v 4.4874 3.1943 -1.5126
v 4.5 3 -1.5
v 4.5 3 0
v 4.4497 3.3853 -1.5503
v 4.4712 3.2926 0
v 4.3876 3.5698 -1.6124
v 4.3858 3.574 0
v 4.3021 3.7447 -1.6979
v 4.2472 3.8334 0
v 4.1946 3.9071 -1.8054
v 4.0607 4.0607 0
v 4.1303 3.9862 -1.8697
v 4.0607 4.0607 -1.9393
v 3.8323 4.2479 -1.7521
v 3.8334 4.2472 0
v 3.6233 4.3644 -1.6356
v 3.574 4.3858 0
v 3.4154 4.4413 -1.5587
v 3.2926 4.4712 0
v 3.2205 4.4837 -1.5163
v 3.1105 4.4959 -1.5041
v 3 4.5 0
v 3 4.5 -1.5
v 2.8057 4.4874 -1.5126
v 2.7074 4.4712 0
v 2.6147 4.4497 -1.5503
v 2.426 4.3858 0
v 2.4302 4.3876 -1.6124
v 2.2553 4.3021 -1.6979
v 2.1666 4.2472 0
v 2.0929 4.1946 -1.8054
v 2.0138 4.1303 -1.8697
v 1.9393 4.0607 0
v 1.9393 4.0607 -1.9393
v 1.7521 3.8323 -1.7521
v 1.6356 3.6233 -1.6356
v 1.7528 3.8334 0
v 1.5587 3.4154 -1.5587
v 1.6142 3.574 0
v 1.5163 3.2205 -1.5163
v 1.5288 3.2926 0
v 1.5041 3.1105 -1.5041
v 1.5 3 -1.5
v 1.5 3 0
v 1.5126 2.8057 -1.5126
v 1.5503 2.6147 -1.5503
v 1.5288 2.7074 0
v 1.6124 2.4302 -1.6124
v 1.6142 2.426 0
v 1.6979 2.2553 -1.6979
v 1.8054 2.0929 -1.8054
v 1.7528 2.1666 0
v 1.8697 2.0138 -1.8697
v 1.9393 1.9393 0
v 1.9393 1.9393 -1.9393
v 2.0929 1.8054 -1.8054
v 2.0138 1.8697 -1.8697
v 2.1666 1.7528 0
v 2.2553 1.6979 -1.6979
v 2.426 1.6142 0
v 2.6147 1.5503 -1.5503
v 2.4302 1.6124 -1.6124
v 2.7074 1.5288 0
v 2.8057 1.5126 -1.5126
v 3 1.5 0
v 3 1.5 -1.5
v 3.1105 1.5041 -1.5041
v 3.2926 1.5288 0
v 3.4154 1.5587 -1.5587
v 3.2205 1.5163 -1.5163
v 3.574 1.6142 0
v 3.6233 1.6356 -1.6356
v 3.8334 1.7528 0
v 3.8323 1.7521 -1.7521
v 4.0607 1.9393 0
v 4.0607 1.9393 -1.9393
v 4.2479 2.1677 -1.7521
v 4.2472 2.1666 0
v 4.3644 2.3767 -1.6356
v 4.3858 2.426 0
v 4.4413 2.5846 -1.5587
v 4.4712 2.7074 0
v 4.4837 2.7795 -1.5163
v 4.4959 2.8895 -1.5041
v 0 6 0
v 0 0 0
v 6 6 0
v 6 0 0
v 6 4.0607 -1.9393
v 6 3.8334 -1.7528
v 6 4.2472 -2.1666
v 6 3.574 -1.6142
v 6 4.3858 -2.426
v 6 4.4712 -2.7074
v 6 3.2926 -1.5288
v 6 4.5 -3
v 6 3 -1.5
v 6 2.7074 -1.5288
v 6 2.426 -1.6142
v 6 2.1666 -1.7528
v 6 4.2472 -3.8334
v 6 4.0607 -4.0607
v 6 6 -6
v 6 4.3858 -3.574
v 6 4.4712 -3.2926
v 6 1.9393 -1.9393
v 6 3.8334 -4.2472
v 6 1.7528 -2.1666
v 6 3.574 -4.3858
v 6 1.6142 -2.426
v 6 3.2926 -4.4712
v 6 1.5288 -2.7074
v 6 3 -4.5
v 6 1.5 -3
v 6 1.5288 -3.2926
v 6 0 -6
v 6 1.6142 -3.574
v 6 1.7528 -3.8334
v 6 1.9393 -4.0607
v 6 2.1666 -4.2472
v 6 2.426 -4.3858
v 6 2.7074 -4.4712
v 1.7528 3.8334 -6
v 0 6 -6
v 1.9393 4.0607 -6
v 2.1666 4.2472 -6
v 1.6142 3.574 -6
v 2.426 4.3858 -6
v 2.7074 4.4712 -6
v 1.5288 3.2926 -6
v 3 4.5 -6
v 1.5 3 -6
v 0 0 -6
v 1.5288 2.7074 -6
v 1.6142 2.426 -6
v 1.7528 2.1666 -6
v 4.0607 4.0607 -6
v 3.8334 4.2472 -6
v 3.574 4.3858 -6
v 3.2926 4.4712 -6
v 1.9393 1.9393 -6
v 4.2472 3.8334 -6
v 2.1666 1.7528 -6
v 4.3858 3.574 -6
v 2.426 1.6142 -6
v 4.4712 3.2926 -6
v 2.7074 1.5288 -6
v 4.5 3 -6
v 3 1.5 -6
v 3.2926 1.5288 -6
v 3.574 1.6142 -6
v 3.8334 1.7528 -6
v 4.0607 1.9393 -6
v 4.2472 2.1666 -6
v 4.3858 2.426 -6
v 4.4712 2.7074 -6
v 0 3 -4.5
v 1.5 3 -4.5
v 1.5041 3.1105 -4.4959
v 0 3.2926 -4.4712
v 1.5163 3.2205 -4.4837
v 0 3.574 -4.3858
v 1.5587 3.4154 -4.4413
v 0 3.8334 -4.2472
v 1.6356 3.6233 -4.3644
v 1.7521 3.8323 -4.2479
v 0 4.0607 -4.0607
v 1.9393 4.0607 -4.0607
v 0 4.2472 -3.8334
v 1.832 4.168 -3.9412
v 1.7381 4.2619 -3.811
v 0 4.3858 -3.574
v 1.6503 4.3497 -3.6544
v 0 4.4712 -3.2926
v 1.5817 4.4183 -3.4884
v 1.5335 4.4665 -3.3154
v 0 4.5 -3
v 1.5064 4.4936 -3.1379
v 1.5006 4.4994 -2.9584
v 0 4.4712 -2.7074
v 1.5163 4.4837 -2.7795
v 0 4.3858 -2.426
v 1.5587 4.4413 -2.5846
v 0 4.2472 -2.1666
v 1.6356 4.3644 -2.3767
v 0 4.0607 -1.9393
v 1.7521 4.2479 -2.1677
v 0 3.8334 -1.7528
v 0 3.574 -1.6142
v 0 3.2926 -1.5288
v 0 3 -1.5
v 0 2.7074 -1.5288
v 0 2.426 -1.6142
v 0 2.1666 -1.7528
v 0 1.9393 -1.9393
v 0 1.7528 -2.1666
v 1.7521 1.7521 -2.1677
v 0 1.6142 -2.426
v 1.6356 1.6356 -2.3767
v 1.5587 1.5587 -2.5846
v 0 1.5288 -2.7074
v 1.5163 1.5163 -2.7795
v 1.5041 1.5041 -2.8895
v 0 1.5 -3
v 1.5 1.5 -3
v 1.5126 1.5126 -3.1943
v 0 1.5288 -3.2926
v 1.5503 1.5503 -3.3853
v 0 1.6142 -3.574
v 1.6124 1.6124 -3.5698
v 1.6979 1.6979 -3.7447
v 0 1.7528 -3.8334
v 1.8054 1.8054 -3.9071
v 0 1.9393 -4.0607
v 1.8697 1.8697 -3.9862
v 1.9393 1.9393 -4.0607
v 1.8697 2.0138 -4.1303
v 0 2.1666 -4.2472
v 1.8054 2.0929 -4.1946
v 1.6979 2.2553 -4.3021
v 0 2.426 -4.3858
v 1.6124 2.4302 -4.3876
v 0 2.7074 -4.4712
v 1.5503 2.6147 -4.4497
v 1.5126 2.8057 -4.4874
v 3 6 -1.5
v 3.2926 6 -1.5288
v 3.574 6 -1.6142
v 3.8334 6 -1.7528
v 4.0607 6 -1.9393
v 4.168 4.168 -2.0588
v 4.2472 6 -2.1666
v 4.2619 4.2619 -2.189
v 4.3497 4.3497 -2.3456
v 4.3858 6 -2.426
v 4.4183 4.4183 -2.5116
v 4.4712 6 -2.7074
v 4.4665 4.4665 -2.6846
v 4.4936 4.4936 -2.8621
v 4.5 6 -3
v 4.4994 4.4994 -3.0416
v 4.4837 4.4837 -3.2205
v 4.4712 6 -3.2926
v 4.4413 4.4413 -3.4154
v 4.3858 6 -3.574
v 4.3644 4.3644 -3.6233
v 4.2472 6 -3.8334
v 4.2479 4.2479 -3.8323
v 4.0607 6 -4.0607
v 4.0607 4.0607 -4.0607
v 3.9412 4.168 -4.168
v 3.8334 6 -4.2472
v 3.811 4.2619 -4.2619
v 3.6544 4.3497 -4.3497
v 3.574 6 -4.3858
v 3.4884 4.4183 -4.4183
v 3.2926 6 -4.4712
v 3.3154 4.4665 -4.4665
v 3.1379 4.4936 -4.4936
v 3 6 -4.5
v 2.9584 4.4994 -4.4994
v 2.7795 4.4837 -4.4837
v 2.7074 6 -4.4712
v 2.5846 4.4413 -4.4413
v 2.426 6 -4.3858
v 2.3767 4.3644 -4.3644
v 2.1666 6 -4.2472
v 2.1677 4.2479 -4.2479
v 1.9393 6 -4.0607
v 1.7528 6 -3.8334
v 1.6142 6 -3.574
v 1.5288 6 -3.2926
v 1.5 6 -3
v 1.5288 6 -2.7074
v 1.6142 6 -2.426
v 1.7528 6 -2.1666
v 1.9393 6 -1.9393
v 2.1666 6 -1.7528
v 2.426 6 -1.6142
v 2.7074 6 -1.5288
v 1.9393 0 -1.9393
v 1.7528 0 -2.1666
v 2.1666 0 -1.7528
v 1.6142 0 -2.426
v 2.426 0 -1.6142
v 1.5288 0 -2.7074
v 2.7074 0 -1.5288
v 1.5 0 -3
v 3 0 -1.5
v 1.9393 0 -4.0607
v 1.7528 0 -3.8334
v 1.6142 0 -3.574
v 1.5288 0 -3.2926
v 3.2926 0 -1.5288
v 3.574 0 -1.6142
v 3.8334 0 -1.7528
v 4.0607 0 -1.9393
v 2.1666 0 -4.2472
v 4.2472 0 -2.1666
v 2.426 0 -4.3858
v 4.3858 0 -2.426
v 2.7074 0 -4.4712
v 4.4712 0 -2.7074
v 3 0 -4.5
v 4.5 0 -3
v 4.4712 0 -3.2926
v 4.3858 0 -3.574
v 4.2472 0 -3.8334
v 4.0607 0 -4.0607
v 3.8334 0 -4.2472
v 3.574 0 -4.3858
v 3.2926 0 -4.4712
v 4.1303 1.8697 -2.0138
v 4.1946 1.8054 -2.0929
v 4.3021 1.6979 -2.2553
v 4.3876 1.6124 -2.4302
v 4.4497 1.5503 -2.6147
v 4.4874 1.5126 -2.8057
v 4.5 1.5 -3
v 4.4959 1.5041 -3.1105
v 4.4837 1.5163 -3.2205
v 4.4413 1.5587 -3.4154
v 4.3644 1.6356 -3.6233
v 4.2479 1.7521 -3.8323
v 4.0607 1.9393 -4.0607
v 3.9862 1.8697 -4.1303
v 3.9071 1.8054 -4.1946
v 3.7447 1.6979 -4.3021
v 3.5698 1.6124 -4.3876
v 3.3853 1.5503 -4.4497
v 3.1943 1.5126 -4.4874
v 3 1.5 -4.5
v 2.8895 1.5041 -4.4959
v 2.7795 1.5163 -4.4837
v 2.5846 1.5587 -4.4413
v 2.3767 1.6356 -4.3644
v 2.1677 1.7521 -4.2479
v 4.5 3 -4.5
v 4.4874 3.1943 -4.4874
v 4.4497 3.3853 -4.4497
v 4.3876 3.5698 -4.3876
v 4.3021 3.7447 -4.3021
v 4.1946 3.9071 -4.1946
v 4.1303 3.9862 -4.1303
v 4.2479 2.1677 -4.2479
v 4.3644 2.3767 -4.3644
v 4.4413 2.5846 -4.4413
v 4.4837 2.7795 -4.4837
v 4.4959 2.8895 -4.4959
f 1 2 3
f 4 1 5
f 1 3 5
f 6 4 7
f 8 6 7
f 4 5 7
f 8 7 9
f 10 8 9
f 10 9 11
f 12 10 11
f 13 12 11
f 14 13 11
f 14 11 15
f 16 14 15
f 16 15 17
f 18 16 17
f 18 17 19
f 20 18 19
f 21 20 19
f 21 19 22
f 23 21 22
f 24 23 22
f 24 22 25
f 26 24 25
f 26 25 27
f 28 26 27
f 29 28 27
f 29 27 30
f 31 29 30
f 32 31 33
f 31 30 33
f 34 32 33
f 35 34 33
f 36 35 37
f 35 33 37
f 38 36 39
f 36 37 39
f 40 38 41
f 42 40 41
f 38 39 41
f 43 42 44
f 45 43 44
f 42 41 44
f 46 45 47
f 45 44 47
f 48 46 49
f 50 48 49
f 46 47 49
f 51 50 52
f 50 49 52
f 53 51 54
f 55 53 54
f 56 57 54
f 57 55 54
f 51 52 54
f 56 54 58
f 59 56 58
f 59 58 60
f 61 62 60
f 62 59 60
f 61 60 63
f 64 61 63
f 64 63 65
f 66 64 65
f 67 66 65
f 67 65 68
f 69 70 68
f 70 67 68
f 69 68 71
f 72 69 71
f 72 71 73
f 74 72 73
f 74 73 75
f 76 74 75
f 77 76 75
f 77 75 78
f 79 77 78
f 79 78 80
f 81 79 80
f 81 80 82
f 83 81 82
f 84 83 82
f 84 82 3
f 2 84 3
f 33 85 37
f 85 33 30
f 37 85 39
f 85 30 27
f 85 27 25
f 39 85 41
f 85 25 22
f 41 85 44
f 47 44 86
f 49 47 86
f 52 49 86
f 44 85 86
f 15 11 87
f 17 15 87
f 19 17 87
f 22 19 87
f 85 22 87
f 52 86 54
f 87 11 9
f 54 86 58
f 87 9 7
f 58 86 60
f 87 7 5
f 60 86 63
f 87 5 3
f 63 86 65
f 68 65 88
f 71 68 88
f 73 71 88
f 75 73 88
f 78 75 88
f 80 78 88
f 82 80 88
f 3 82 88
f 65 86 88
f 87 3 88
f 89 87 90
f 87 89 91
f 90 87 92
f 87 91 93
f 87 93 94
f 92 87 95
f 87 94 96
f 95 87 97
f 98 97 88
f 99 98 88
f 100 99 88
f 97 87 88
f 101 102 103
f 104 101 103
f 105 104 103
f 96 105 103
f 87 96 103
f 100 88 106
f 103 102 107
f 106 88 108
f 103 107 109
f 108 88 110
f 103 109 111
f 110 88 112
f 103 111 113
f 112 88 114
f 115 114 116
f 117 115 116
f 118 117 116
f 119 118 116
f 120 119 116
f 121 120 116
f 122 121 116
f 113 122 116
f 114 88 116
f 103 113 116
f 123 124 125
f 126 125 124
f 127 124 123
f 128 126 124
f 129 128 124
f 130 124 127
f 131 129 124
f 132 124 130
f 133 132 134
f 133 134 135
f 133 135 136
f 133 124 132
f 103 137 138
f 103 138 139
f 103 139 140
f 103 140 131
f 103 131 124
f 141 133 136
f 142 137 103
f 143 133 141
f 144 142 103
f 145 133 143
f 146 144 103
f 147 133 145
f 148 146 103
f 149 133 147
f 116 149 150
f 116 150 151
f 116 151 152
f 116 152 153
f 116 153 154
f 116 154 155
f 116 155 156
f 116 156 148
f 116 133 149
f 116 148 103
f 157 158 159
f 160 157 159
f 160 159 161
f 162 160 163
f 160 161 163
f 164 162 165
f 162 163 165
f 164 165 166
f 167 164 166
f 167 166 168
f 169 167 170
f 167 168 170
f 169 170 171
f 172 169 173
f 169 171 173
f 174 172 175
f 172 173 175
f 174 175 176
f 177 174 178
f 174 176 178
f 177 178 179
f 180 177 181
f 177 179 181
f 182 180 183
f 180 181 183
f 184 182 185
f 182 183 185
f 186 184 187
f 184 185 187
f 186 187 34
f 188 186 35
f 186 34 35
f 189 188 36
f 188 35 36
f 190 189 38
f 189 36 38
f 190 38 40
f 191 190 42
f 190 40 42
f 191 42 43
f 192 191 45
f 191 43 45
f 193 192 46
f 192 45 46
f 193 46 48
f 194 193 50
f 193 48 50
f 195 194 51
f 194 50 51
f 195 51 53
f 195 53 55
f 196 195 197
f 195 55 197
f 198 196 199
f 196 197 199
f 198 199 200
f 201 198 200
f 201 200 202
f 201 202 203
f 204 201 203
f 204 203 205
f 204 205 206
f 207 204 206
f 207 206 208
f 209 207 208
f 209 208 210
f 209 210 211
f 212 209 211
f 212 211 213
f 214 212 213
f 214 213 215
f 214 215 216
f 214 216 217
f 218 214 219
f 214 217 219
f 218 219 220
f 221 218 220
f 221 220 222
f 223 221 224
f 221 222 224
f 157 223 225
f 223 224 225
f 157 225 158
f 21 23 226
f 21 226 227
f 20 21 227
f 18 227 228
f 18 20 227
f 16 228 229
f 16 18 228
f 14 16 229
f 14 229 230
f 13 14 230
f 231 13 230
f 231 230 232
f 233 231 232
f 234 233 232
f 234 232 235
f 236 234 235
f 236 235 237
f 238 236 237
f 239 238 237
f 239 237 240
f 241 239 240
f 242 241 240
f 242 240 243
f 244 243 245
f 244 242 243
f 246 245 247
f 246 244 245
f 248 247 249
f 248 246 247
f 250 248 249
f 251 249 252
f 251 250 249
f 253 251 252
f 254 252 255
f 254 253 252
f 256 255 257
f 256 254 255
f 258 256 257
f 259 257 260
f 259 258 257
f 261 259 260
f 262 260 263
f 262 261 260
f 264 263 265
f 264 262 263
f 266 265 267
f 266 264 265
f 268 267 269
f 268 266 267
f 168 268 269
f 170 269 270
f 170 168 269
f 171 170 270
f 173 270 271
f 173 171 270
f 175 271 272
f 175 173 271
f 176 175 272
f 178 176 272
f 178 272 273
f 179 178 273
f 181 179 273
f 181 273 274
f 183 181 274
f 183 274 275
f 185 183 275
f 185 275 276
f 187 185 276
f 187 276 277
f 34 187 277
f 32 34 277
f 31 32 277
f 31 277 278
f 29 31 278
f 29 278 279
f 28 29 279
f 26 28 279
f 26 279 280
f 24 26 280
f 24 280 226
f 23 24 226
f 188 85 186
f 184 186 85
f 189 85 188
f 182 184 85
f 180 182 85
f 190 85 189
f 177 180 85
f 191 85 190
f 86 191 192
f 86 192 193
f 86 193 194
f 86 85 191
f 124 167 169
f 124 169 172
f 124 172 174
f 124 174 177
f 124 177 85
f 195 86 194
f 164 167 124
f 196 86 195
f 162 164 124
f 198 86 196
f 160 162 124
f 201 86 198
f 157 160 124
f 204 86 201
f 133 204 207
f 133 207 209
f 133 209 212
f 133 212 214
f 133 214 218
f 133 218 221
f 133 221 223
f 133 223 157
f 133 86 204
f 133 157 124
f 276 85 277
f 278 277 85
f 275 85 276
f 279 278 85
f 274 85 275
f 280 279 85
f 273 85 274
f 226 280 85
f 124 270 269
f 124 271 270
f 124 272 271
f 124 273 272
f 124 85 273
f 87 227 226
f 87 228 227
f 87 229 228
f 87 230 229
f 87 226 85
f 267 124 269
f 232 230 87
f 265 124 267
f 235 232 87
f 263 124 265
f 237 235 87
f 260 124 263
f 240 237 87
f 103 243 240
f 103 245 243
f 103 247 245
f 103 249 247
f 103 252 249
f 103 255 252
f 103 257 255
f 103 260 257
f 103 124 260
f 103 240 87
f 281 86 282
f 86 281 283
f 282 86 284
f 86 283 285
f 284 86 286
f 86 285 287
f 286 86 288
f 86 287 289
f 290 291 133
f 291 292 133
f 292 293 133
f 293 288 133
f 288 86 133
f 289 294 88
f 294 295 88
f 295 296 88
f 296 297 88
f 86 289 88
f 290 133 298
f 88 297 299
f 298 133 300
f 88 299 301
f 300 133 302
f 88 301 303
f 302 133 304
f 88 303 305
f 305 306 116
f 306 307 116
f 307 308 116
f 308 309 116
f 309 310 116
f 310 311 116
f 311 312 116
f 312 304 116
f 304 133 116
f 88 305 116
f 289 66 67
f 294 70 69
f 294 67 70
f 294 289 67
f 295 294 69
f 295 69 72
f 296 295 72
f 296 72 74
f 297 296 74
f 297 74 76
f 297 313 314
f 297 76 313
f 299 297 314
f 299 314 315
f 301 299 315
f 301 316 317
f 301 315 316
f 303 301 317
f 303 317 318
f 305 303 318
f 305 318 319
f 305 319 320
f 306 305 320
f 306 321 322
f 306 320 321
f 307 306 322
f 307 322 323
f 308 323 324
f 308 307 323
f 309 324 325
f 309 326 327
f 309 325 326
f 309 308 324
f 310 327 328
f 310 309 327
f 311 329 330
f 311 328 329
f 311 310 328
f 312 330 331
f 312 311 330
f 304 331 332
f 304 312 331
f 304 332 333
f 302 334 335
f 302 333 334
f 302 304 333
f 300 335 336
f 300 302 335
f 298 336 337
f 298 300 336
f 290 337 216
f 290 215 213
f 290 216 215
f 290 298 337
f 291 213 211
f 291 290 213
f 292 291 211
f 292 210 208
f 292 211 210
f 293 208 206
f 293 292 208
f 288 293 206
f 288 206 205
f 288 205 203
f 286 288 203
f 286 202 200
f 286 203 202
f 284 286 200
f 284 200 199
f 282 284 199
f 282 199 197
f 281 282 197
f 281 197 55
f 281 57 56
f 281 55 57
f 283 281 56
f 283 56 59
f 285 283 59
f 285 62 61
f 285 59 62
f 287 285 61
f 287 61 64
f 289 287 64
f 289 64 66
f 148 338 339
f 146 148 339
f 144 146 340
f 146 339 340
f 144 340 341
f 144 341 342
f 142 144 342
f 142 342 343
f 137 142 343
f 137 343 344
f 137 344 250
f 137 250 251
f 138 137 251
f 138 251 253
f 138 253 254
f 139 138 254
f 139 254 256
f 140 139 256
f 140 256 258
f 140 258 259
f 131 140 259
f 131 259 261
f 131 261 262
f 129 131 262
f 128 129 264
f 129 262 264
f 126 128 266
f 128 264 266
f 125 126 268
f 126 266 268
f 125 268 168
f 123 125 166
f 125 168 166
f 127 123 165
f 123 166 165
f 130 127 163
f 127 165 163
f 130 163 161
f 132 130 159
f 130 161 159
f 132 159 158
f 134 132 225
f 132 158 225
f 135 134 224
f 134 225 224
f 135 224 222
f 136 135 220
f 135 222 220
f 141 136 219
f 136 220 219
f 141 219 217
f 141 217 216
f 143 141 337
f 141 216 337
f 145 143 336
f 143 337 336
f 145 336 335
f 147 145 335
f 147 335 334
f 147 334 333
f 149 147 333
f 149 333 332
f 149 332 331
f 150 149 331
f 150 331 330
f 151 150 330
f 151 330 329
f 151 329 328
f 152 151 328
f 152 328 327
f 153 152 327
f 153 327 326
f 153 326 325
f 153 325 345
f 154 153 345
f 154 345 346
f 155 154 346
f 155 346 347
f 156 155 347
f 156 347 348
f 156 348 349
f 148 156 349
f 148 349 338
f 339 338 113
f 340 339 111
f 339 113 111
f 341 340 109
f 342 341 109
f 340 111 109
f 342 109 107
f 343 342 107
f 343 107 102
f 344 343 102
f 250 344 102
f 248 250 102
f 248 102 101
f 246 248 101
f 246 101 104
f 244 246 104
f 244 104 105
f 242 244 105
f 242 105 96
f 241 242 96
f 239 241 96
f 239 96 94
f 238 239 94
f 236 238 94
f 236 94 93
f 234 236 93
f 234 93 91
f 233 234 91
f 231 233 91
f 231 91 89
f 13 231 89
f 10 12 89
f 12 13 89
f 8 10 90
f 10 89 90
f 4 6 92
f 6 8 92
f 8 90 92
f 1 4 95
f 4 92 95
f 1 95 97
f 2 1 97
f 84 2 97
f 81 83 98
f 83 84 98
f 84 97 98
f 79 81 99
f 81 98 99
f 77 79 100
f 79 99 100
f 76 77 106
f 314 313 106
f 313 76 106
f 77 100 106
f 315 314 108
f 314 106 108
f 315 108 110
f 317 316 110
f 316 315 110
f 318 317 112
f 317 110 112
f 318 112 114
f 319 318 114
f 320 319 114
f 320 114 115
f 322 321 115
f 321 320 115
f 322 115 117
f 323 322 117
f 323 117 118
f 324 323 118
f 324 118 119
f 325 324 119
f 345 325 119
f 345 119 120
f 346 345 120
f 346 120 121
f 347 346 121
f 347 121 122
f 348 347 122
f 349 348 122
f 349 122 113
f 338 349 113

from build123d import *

# Parameters (mm, degrees)
SKETCH_1_W          = 6
SKETCH_1_H          = 6
SKETCH_1_R          = 1.5
EXTRUDE_1_DEPTH     = 6
SKETCH_2_R          = 1.5
CUT_EXTRUDE_1_DEPTH = 6
SKETCH_3_R          = 1.5
CUT_EXTRUDE_2_DEPTH = 6


with BuildPart() as part:
    # 草图1 → 凸台-拉伸1 (new body)
    with BuildSketch(Plane(origin=(0, 0, 0), x_dir=(1, 0, 0), z_dir=(0, 1, 0))):
        with Locations((3, 3)):
            Rectangle(SKETCH_1_W, SKETCH_1_H)
        with Locations(Location((3, 3, 0), (0, 0, 270))):
            Circle(SKETCH_1_R, mode=Mode.SUBTRACT)
    extrude(amount=EXTRUDE_1_DEPTH)

    # 草图2 → 切除-拉伸1 (cut)
    with BuildSketch(Plane.XY):
        with Locations((3, 3)):
            Circle(SKETCH_2_R)
    extrude(amount=-CUT_EXTRUDE_1_DEPTH, mode=Mode.SUBTRACT)

    # 草图3 → 切除-拉伸2 (cut)
    with BuildSketch(Plane(origin=(6, 0, 0), x_dir=(0, 0, -1), z_dir=(1, 0, 0))):
        with Locations((3, 3)):
            Circle(SKETCH_3_R)
    extrude(amount=-CUT_EXTRUDE_2_DEPTH, mode=Mode.SUBTRACT)


solid = part.part
